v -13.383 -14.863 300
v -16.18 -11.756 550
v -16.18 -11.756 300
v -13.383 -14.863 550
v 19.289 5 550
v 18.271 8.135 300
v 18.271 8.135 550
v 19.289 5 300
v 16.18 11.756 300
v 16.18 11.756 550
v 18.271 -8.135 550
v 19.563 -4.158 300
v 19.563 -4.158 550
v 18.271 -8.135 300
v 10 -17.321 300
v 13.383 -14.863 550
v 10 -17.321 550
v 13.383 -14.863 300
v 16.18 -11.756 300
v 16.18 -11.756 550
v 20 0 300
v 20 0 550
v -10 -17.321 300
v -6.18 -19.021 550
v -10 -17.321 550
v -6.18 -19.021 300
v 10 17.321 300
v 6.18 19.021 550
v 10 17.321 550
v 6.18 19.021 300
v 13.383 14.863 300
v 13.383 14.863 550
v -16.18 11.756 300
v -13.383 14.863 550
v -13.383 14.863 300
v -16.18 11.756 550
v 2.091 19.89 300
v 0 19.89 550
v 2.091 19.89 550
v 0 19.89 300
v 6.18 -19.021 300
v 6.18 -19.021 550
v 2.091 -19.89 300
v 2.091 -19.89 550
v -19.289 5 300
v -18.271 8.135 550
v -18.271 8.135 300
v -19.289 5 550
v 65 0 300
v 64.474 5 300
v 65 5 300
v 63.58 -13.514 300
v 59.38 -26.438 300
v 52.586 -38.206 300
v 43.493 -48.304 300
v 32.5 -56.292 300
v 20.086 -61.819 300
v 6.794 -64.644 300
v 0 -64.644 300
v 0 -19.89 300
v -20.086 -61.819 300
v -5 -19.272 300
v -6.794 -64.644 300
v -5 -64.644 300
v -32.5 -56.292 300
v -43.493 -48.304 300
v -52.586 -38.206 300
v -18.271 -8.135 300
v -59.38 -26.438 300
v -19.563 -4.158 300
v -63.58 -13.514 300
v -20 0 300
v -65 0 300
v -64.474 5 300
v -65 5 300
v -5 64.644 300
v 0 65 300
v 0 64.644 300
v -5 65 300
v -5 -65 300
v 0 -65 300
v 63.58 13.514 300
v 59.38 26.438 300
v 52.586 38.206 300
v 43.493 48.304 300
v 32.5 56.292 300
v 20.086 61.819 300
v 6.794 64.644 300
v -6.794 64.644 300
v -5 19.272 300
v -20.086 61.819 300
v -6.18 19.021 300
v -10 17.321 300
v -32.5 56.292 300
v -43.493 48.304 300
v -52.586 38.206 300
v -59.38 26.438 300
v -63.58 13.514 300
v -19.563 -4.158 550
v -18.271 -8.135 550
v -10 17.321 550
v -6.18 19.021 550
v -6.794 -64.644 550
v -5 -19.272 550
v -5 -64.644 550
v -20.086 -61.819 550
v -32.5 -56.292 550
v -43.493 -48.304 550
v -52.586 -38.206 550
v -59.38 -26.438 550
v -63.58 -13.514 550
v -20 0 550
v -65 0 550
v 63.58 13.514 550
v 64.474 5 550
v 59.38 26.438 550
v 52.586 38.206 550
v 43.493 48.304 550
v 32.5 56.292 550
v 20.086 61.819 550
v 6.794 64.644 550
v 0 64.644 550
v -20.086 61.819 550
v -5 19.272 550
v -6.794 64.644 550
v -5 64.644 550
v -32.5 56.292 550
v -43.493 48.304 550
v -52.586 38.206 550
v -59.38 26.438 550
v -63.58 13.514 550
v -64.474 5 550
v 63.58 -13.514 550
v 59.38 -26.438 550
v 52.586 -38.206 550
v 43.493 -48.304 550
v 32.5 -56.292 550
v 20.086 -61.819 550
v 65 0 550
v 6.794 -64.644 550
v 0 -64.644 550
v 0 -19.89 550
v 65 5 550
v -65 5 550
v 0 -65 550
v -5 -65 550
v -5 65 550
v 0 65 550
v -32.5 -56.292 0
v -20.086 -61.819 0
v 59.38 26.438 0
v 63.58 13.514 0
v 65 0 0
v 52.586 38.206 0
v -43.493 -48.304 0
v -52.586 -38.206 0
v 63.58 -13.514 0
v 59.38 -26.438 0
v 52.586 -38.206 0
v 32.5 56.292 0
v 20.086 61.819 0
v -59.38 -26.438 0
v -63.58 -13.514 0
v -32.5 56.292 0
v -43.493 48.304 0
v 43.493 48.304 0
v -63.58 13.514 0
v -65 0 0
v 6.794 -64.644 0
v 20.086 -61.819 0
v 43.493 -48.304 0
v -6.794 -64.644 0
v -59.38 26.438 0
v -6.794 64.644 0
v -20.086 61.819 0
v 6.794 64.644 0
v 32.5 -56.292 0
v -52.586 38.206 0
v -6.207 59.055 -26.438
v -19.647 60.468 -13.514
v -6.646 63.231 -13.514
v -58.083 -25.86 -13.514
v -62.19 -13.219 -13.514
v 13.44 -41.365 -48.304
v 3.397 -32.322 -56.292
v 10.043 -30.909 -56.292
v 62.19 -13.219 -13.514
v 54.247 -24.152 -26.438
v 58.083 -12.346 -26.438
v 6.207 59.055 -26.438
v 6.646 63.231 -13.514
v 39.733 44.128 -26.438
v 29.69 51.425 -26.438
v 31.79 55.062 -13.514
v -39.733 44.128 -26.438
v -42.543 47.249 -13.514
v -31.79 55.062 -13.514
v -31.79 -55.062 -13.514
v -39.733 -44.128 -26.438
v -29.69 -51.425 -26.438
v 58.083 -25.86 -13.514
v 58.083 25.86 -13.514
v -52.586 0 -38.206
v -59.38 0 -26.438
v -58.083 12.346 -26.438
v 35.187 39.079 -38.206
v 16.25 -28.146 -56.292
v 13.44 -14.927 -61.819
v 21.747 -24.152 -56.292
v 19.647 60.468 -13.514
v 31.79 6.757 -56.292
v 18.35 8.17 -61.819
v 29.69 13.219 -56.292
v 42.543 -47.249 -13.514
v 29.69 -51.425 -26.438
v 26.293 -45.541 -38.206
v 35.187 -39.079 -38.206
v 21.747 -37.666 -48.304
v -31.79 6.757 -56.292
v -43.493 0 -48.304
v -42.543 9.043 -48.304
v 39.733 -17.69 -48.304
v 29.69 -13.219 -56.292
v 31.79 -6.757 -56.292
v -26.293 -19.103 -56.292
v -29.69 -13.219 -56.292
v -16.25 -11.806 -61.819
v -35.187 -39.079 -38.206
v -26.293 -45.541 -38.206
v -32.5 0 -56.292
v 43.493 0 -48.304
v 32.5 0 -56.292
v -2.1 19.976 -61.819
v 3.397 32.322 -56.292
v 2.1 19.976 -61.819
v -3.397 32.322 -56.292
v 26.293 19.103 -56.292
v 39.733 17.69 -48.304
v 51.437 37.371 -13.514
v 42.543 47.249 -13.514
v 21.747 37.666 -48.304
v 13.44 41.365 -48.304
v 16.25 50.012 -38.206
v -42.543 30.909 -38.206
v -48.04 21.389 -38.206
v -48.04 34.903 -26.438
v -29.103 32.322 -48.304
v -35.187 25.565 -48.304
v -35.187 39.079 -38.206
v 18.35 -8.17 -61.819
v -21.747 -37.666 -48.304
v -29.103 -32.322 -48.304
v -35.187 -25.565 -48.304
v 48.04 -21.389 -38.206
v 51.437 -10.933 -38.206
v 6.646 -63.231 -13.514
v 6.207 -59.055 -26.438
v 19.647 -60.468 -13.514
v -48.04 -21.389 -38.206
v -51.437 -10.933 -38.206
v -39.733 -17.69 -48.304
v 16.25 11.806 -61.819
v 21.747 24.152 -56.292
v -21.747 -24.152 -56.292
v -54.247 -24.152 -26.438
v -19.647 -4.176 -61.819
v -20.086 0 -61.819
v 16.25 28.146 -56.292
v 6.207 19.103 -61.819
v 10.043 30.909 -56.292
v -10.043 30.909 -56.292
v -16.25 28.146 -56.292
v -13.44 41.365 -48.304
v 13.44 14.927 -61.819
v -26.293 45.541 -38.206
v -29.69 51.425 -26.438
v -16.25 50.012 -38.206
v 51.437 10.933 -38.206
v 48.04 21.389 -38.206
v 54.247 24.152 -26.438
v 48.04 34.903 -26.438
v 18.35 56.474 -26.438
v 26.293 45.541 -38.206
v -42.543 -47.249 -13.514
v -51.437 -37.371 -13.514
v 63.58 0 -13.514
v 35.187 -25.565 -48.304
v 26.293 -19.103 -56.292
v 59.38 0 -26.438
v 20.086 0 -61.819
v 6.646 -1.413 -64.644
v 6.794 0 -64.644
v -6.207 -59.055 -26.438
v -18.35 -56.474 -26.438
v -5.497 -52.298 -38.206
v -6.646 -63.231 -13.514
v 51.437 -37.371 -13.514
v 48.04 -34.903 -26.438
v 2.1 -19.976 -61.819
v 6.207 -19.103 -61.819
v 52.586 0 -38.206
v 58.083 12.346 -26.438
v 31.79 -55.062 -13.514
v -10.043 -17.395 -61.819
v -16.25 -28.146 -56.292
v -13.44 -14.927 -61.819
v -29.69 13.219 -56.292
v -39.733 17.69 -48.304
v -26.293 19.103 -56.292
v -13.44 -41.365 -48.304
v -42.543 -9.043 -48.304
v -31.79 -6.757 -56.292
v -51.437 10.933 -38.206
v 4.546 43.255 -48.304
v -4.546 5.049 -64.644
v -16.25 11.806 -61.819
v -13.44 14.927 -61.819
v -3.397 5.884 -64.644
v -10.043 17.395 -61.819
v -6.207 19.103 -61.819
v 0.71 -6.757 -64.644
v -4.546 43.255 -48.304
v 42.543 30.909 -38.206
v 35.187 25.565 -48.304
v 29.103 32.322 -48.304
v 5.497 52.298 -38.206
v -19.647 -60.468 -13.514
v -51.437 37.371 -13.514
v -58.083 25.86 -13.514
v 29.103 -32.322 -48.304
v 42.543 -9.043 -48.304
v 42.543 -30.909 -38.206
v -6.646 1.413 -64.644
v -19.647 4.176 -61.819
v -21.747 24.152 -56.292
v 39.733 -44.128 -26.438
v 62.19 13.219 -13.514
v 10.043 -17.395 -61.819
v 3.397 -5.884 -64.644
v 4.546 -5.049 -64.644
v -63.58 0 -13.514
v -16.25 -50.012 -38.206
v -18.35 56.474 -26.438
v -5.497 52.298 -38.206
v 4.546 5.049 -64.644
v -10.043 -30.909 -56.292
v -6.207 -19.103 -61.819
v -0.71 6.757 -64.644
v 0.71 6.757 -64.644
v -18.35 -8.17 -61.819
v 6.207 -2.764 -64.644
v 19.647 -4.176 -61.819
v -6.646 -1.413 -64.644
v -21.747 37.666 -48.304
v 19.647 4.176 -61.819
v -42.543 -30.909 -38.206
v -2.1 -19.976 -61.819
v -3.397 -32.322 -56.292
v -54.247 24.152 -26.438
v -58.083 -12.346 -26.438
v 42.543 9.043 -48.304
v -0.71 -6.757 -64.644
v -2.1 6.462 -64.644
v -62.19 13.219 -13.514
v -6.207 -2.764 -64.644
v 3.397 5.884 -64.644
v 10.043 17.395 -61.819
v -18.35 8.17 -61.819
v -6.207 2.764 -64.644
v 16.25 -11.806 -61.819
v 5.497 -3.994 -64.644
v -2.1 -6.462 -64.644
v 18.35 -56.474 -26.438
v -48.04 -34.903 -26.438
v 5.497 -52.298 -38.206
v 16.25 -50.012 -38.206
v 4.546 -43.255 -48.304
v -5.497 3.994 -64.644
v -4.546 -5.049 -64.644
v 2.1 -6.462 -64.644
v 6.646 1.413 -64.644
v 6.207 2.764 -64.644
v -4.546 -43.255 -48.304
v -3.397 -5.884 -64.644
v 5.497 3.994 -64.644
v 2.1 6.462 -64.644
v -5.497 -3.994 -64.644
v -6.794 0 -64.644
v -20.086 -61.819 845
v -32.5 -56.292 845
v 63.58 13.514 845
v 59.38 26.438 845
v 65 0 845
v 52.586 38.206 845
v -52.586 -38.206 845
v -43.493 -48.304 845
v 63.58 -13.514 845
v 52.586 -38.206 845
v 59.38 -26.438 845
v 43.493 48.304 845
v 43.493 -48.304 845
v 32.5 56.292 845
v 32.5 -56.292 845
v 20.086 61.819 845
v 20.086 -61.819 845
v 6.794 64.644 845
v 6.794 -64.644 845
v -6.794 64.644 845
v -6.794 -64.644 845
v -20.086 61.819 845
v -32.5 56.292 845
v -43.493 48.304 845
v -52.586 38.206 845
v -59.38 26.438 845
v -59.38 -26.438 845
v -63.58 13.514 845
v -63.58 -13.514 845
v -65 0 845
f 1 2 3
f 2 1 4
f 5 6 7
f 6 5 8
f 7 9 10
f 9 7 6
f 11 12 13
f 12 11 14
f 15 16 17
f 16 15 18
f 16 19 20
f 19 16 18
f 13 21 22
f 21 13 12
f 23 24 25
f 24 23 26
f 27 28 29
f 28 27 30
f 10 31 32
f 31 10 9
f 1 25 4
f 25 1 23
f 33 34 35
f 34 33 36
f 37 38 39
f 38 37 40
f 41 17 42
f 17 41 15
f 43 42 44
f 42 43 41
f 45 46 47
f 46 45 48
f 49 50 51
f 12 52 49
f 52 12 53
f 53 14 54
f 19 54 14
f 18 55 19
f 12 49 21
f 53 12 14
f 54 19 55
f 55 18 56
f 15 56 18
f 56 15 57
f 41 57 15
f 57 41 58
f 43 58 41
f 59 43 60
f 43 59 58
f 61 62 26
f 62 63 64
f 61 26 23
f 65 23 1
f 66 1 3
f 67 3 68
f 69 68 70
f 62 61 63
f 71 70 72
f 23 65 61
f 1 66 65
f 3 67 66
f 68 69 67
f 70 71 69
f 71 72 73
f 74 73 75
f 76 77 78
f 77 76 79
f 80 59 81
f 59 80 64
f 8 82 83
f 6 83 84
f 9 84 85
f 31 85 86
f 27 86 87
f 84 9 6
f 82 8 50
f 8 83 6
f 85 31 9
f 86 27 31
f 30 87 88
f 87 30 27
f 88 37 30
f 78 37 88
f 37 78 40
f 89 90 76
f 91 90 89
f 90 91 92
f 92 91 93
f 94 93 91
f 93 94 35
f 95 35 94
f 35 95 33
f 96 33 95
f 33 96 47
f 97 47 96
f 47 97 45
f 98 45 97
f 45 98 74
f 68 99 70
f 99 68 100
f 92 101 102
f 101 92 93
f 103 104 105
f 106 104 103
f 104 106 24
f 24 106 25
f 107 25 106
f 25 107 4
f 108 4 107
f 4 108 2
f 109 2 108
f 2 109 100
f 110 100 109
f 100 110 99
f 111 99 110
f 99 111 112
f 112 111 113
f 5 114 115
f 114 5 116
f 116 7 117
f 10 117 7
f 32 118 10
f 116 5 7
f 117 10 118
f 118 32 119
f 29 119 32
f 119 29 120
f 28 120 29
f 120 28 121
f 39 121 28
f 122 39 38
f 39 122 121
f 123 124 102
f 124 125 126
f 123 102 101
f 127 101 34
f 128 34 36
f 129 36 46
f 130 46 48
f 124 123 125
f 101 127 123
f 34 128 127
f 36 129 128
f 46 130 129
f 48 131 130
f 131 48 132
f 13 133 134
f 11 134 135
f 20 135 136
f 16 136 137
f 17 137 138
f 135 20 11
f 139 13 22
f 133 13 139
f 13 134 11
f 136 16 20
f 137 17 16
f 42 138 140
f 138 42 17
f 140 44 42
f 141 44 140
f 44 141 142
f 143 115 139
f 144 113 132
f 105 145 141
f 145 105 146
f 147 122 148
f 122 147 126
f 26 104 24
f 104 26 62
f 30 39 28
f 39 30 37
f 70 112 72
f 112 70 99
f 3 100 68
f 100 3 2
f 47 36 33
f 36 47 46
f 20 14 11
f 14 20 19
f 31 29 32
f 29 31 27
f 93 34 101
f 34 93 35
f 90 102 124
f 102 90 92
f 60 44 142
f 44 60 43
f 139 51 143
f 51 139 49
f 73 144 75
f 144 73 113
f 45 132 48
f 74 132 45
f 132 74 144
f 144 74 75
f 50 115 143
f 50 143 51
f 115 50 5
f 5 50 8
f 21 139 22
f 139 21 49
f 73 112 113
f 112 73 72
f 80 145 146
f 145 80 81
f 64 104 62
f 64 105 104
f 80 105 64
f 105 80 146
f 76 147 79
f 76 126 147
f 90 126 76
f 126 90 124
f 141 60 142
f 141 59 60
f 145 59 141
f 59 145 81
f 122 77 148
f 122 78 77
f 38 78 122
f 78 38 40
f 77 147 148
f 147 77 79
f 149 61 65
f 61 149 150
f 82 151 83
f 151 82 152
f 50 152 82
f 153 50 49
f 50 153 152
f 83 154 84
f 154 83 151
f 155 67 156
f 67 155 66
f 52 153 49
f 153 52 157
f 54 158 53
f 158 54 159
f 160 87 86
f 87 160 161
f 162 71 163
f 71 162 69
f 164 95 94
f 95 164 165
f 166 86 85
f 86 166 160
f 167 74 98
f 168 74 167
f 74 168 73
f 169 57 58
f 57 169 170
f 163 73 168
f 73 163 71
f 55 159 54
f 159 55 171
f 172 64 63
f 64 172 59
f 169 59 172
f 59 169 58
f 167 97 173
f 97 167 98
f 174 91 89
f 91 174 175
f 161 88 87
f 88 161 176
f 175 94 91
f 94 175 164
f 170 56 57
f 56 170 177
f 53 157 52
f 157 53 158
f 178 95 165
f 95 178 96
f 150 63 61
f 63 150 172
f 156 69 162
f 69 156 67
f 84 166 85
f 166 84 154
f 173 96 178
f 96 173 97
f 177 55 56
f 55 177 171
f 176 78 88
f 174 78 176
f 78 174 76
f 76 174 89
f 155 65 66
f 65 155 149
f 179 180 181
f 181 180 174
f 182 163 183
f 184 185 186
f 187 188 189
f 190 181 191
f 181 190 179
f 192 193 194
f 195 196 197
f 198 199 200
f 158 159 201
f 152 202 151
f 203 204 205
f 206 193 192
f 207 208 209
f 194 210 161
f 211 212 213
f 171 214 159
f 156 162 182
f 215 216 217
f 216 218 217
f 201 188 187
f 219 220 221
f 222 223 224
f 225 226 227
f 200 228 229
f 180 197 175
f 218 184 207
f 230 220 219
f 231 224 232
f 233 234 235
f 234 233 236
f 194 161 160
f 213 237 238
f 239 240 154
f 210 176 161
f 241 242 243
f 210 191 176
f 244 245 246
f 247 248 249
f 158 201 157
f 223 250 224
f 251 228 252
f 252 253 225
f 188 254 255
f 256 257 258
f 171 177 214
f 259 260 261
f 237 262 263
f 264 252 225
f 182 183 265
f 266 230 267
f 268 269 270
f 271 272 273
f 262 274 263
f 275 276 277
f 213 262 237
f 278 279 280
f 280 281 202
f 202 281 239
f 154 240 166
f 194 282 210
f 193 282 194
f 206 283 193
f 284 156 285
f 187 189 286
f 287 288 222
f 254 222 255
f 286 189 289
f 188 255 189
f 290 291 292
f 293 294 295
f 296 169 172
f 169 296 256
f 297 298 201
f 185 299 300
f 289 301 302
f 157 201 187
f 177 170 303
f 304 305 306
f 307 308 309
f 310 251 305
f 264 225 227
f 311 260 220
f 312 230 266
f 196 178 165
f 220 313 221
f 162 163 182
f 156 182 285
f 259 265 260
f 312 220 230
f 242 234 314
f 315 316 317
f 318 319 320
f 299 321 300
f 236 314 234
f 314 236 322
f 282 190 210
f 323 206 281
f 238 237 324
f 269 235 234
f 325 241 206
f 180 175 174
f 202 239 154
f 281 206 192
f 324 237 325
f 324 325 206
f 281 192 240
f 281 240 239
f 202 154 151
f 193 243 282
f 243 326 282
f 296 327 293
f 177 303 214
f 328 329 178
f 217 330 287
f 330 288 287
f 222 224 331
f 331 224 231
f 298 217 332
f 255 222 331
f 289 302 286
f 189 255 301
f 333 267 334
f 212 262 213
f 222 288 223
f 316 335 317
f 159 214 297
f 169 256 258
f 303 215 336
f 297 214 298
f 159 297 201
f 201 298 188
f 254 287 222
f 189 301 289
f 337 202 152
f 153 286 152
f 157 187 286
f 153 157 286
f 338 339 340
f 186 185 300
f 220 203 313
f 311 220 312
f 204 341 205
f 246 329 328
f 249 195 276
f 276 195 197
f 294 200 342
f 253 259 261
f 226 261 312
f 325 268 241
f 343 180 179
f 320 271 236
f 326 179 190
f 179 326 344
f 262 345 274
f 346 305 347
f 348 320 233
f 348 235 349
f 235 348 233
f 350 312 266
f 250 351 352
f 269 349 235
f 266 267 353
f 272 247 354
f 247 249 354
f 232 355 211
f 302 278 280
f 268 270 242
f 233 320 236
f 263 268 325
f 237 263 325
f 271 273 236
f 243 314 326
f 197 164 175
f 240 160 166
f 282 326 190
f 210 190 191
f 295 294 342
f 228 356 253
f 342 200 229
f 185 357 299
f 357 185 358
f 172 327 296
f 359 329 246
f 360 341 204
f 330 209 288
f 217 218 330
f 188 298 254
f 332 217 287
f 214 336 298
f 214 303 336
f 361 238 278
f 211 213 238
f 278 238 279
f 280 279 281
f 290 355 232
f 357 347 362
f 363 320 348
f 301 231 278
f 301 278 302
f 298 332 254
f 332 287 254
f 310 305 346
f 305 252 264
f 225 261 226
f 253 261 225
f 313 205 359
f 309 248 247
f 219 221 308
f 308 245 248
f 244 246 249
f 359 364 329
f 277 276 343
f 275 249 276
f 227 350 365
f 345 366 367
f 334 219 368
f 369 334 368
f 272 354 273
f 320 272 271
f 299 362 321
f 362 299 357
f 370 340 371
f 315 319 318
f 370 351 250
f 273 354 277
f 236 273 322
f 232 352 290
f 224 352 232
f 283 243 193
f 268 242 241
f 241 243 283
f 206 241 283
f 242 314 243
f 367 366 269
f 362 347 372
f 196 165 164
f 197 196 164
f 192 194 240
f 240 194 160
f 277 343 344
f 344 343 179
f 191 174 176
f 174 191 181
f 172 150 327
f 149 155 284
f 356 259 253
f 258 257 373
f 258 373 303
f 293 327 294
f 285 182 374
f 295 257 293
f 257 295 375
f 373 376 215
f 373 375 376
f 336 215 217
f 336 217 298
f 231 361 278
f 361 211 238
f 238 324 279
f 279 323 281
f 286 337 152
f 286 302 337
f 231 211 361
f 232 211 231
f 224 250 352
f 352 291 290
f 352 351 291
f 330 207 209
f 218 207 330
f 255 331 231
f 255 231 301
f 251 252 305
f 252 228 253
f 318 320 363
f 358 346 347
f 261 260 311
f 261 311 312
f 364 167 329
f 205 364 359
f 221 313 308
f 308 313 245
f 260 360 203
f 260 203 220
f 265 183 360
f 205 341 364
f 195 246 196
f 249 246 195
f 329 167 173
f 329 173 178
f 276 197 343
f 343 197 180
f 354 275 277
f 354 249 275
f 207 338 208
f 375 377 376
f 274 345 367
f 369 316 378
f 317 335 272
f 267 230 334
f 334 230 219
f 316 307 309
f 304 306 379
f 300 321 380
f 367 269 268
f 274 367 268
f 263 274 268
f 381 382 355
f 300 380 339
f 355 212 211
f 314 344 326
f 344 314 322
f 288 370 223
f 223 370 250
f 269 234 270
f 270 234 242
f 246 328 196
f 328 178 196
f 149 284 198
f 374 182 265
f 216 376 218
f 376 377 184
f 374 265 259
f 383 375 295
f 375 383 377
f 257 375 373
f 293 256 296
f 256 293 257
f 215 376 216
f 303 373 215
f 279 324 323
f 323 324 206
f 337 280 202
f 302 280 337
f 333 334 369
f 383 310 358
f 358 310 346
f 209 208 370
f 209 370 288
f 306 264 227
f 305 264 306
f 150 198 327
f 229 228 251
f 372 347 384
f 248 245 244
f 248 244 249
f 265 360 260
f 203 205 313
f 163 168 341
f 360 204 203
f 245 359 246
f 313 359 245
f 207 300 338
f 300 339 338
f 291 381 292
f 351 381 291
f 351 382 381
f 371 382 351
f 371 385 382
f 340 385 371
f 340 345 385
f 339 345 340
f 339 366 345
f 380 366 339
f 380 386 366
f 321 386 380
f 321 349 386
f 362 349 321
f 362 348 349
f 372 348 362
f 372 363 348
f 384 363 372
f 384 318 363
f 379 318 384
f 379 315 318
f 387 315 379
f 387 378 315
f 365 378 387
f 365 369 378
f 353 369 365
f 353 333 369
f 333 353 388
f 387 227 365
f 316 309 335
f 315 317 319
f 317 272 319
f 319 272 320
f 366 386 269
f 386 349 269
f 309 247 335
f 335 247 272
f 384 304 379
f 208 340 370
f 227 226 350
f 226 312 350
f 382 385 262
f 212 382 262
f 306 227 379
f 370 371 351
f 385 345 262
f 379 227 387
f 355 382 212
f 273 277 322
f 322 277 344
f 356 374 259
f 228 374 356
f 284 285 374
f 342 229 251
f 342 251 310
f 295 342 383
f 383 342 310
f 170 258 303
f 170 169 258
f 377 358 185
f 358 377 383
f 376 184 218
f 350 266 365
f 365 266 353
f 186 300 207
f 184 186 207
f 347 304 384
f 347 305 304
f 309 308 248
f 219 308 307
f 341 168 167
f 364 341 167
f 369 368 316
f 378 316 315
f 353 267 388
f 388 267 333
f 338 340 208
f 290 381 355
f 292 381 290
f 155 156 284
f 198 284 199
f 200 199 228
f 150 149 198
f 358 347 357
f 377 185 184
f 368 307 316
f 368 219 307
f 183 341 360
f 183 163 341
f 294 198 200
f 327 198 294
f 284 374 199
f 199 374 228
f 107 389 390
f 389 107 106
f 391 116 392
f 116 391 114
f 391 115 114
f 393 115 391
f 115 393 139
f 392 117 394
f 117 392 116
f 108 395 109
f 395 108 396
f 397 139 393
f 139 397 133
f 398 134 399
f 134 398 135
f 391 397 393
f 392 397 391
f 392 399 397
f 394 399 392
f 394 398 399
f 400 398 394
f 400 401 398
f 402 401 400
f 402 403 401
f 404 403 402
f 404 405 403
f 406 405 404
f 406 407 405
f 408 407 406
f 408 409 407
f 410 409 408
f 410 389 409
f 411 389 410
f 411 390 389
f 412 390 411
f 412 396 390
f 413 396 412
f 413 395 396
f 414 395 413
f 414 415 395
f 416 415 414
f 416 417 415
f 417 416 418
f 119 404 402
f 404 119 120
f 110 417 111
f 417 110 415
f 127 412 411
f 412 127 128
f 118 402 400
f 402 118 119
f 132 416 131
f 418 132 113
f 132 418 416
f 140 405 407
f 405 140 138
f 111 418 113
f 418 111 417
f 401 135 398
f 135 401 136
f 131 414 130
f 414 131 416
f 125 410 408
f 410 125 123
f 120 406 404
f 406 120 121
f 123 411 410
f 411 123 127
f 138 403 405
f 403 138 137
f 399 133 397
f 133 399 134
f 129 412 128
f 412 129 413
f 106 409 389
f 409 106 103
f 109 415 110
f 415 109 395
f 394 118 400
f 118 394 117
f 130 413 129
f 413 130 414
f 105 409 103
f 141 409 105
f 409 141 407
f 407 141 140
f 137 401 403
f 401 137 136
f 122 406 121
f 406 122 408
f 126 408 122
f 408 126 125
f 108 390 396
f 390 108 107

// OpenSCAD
fn=64;
 translate([0,0,550])  cylinder(h=295,r1=65,r2=65);
union() {
 translate([0,0,300])  cylinder(h=250,r1=20.0,r2=20.0);
 translate([-65,0,300])  cube([130,5,250]);
 translate([0,-65,300])  rotate([0,0,90])  cube([130,5,250]);
}
union() {
 cylinder(h=300,r1=65,r2=65);
 sphere(r=65);
}
